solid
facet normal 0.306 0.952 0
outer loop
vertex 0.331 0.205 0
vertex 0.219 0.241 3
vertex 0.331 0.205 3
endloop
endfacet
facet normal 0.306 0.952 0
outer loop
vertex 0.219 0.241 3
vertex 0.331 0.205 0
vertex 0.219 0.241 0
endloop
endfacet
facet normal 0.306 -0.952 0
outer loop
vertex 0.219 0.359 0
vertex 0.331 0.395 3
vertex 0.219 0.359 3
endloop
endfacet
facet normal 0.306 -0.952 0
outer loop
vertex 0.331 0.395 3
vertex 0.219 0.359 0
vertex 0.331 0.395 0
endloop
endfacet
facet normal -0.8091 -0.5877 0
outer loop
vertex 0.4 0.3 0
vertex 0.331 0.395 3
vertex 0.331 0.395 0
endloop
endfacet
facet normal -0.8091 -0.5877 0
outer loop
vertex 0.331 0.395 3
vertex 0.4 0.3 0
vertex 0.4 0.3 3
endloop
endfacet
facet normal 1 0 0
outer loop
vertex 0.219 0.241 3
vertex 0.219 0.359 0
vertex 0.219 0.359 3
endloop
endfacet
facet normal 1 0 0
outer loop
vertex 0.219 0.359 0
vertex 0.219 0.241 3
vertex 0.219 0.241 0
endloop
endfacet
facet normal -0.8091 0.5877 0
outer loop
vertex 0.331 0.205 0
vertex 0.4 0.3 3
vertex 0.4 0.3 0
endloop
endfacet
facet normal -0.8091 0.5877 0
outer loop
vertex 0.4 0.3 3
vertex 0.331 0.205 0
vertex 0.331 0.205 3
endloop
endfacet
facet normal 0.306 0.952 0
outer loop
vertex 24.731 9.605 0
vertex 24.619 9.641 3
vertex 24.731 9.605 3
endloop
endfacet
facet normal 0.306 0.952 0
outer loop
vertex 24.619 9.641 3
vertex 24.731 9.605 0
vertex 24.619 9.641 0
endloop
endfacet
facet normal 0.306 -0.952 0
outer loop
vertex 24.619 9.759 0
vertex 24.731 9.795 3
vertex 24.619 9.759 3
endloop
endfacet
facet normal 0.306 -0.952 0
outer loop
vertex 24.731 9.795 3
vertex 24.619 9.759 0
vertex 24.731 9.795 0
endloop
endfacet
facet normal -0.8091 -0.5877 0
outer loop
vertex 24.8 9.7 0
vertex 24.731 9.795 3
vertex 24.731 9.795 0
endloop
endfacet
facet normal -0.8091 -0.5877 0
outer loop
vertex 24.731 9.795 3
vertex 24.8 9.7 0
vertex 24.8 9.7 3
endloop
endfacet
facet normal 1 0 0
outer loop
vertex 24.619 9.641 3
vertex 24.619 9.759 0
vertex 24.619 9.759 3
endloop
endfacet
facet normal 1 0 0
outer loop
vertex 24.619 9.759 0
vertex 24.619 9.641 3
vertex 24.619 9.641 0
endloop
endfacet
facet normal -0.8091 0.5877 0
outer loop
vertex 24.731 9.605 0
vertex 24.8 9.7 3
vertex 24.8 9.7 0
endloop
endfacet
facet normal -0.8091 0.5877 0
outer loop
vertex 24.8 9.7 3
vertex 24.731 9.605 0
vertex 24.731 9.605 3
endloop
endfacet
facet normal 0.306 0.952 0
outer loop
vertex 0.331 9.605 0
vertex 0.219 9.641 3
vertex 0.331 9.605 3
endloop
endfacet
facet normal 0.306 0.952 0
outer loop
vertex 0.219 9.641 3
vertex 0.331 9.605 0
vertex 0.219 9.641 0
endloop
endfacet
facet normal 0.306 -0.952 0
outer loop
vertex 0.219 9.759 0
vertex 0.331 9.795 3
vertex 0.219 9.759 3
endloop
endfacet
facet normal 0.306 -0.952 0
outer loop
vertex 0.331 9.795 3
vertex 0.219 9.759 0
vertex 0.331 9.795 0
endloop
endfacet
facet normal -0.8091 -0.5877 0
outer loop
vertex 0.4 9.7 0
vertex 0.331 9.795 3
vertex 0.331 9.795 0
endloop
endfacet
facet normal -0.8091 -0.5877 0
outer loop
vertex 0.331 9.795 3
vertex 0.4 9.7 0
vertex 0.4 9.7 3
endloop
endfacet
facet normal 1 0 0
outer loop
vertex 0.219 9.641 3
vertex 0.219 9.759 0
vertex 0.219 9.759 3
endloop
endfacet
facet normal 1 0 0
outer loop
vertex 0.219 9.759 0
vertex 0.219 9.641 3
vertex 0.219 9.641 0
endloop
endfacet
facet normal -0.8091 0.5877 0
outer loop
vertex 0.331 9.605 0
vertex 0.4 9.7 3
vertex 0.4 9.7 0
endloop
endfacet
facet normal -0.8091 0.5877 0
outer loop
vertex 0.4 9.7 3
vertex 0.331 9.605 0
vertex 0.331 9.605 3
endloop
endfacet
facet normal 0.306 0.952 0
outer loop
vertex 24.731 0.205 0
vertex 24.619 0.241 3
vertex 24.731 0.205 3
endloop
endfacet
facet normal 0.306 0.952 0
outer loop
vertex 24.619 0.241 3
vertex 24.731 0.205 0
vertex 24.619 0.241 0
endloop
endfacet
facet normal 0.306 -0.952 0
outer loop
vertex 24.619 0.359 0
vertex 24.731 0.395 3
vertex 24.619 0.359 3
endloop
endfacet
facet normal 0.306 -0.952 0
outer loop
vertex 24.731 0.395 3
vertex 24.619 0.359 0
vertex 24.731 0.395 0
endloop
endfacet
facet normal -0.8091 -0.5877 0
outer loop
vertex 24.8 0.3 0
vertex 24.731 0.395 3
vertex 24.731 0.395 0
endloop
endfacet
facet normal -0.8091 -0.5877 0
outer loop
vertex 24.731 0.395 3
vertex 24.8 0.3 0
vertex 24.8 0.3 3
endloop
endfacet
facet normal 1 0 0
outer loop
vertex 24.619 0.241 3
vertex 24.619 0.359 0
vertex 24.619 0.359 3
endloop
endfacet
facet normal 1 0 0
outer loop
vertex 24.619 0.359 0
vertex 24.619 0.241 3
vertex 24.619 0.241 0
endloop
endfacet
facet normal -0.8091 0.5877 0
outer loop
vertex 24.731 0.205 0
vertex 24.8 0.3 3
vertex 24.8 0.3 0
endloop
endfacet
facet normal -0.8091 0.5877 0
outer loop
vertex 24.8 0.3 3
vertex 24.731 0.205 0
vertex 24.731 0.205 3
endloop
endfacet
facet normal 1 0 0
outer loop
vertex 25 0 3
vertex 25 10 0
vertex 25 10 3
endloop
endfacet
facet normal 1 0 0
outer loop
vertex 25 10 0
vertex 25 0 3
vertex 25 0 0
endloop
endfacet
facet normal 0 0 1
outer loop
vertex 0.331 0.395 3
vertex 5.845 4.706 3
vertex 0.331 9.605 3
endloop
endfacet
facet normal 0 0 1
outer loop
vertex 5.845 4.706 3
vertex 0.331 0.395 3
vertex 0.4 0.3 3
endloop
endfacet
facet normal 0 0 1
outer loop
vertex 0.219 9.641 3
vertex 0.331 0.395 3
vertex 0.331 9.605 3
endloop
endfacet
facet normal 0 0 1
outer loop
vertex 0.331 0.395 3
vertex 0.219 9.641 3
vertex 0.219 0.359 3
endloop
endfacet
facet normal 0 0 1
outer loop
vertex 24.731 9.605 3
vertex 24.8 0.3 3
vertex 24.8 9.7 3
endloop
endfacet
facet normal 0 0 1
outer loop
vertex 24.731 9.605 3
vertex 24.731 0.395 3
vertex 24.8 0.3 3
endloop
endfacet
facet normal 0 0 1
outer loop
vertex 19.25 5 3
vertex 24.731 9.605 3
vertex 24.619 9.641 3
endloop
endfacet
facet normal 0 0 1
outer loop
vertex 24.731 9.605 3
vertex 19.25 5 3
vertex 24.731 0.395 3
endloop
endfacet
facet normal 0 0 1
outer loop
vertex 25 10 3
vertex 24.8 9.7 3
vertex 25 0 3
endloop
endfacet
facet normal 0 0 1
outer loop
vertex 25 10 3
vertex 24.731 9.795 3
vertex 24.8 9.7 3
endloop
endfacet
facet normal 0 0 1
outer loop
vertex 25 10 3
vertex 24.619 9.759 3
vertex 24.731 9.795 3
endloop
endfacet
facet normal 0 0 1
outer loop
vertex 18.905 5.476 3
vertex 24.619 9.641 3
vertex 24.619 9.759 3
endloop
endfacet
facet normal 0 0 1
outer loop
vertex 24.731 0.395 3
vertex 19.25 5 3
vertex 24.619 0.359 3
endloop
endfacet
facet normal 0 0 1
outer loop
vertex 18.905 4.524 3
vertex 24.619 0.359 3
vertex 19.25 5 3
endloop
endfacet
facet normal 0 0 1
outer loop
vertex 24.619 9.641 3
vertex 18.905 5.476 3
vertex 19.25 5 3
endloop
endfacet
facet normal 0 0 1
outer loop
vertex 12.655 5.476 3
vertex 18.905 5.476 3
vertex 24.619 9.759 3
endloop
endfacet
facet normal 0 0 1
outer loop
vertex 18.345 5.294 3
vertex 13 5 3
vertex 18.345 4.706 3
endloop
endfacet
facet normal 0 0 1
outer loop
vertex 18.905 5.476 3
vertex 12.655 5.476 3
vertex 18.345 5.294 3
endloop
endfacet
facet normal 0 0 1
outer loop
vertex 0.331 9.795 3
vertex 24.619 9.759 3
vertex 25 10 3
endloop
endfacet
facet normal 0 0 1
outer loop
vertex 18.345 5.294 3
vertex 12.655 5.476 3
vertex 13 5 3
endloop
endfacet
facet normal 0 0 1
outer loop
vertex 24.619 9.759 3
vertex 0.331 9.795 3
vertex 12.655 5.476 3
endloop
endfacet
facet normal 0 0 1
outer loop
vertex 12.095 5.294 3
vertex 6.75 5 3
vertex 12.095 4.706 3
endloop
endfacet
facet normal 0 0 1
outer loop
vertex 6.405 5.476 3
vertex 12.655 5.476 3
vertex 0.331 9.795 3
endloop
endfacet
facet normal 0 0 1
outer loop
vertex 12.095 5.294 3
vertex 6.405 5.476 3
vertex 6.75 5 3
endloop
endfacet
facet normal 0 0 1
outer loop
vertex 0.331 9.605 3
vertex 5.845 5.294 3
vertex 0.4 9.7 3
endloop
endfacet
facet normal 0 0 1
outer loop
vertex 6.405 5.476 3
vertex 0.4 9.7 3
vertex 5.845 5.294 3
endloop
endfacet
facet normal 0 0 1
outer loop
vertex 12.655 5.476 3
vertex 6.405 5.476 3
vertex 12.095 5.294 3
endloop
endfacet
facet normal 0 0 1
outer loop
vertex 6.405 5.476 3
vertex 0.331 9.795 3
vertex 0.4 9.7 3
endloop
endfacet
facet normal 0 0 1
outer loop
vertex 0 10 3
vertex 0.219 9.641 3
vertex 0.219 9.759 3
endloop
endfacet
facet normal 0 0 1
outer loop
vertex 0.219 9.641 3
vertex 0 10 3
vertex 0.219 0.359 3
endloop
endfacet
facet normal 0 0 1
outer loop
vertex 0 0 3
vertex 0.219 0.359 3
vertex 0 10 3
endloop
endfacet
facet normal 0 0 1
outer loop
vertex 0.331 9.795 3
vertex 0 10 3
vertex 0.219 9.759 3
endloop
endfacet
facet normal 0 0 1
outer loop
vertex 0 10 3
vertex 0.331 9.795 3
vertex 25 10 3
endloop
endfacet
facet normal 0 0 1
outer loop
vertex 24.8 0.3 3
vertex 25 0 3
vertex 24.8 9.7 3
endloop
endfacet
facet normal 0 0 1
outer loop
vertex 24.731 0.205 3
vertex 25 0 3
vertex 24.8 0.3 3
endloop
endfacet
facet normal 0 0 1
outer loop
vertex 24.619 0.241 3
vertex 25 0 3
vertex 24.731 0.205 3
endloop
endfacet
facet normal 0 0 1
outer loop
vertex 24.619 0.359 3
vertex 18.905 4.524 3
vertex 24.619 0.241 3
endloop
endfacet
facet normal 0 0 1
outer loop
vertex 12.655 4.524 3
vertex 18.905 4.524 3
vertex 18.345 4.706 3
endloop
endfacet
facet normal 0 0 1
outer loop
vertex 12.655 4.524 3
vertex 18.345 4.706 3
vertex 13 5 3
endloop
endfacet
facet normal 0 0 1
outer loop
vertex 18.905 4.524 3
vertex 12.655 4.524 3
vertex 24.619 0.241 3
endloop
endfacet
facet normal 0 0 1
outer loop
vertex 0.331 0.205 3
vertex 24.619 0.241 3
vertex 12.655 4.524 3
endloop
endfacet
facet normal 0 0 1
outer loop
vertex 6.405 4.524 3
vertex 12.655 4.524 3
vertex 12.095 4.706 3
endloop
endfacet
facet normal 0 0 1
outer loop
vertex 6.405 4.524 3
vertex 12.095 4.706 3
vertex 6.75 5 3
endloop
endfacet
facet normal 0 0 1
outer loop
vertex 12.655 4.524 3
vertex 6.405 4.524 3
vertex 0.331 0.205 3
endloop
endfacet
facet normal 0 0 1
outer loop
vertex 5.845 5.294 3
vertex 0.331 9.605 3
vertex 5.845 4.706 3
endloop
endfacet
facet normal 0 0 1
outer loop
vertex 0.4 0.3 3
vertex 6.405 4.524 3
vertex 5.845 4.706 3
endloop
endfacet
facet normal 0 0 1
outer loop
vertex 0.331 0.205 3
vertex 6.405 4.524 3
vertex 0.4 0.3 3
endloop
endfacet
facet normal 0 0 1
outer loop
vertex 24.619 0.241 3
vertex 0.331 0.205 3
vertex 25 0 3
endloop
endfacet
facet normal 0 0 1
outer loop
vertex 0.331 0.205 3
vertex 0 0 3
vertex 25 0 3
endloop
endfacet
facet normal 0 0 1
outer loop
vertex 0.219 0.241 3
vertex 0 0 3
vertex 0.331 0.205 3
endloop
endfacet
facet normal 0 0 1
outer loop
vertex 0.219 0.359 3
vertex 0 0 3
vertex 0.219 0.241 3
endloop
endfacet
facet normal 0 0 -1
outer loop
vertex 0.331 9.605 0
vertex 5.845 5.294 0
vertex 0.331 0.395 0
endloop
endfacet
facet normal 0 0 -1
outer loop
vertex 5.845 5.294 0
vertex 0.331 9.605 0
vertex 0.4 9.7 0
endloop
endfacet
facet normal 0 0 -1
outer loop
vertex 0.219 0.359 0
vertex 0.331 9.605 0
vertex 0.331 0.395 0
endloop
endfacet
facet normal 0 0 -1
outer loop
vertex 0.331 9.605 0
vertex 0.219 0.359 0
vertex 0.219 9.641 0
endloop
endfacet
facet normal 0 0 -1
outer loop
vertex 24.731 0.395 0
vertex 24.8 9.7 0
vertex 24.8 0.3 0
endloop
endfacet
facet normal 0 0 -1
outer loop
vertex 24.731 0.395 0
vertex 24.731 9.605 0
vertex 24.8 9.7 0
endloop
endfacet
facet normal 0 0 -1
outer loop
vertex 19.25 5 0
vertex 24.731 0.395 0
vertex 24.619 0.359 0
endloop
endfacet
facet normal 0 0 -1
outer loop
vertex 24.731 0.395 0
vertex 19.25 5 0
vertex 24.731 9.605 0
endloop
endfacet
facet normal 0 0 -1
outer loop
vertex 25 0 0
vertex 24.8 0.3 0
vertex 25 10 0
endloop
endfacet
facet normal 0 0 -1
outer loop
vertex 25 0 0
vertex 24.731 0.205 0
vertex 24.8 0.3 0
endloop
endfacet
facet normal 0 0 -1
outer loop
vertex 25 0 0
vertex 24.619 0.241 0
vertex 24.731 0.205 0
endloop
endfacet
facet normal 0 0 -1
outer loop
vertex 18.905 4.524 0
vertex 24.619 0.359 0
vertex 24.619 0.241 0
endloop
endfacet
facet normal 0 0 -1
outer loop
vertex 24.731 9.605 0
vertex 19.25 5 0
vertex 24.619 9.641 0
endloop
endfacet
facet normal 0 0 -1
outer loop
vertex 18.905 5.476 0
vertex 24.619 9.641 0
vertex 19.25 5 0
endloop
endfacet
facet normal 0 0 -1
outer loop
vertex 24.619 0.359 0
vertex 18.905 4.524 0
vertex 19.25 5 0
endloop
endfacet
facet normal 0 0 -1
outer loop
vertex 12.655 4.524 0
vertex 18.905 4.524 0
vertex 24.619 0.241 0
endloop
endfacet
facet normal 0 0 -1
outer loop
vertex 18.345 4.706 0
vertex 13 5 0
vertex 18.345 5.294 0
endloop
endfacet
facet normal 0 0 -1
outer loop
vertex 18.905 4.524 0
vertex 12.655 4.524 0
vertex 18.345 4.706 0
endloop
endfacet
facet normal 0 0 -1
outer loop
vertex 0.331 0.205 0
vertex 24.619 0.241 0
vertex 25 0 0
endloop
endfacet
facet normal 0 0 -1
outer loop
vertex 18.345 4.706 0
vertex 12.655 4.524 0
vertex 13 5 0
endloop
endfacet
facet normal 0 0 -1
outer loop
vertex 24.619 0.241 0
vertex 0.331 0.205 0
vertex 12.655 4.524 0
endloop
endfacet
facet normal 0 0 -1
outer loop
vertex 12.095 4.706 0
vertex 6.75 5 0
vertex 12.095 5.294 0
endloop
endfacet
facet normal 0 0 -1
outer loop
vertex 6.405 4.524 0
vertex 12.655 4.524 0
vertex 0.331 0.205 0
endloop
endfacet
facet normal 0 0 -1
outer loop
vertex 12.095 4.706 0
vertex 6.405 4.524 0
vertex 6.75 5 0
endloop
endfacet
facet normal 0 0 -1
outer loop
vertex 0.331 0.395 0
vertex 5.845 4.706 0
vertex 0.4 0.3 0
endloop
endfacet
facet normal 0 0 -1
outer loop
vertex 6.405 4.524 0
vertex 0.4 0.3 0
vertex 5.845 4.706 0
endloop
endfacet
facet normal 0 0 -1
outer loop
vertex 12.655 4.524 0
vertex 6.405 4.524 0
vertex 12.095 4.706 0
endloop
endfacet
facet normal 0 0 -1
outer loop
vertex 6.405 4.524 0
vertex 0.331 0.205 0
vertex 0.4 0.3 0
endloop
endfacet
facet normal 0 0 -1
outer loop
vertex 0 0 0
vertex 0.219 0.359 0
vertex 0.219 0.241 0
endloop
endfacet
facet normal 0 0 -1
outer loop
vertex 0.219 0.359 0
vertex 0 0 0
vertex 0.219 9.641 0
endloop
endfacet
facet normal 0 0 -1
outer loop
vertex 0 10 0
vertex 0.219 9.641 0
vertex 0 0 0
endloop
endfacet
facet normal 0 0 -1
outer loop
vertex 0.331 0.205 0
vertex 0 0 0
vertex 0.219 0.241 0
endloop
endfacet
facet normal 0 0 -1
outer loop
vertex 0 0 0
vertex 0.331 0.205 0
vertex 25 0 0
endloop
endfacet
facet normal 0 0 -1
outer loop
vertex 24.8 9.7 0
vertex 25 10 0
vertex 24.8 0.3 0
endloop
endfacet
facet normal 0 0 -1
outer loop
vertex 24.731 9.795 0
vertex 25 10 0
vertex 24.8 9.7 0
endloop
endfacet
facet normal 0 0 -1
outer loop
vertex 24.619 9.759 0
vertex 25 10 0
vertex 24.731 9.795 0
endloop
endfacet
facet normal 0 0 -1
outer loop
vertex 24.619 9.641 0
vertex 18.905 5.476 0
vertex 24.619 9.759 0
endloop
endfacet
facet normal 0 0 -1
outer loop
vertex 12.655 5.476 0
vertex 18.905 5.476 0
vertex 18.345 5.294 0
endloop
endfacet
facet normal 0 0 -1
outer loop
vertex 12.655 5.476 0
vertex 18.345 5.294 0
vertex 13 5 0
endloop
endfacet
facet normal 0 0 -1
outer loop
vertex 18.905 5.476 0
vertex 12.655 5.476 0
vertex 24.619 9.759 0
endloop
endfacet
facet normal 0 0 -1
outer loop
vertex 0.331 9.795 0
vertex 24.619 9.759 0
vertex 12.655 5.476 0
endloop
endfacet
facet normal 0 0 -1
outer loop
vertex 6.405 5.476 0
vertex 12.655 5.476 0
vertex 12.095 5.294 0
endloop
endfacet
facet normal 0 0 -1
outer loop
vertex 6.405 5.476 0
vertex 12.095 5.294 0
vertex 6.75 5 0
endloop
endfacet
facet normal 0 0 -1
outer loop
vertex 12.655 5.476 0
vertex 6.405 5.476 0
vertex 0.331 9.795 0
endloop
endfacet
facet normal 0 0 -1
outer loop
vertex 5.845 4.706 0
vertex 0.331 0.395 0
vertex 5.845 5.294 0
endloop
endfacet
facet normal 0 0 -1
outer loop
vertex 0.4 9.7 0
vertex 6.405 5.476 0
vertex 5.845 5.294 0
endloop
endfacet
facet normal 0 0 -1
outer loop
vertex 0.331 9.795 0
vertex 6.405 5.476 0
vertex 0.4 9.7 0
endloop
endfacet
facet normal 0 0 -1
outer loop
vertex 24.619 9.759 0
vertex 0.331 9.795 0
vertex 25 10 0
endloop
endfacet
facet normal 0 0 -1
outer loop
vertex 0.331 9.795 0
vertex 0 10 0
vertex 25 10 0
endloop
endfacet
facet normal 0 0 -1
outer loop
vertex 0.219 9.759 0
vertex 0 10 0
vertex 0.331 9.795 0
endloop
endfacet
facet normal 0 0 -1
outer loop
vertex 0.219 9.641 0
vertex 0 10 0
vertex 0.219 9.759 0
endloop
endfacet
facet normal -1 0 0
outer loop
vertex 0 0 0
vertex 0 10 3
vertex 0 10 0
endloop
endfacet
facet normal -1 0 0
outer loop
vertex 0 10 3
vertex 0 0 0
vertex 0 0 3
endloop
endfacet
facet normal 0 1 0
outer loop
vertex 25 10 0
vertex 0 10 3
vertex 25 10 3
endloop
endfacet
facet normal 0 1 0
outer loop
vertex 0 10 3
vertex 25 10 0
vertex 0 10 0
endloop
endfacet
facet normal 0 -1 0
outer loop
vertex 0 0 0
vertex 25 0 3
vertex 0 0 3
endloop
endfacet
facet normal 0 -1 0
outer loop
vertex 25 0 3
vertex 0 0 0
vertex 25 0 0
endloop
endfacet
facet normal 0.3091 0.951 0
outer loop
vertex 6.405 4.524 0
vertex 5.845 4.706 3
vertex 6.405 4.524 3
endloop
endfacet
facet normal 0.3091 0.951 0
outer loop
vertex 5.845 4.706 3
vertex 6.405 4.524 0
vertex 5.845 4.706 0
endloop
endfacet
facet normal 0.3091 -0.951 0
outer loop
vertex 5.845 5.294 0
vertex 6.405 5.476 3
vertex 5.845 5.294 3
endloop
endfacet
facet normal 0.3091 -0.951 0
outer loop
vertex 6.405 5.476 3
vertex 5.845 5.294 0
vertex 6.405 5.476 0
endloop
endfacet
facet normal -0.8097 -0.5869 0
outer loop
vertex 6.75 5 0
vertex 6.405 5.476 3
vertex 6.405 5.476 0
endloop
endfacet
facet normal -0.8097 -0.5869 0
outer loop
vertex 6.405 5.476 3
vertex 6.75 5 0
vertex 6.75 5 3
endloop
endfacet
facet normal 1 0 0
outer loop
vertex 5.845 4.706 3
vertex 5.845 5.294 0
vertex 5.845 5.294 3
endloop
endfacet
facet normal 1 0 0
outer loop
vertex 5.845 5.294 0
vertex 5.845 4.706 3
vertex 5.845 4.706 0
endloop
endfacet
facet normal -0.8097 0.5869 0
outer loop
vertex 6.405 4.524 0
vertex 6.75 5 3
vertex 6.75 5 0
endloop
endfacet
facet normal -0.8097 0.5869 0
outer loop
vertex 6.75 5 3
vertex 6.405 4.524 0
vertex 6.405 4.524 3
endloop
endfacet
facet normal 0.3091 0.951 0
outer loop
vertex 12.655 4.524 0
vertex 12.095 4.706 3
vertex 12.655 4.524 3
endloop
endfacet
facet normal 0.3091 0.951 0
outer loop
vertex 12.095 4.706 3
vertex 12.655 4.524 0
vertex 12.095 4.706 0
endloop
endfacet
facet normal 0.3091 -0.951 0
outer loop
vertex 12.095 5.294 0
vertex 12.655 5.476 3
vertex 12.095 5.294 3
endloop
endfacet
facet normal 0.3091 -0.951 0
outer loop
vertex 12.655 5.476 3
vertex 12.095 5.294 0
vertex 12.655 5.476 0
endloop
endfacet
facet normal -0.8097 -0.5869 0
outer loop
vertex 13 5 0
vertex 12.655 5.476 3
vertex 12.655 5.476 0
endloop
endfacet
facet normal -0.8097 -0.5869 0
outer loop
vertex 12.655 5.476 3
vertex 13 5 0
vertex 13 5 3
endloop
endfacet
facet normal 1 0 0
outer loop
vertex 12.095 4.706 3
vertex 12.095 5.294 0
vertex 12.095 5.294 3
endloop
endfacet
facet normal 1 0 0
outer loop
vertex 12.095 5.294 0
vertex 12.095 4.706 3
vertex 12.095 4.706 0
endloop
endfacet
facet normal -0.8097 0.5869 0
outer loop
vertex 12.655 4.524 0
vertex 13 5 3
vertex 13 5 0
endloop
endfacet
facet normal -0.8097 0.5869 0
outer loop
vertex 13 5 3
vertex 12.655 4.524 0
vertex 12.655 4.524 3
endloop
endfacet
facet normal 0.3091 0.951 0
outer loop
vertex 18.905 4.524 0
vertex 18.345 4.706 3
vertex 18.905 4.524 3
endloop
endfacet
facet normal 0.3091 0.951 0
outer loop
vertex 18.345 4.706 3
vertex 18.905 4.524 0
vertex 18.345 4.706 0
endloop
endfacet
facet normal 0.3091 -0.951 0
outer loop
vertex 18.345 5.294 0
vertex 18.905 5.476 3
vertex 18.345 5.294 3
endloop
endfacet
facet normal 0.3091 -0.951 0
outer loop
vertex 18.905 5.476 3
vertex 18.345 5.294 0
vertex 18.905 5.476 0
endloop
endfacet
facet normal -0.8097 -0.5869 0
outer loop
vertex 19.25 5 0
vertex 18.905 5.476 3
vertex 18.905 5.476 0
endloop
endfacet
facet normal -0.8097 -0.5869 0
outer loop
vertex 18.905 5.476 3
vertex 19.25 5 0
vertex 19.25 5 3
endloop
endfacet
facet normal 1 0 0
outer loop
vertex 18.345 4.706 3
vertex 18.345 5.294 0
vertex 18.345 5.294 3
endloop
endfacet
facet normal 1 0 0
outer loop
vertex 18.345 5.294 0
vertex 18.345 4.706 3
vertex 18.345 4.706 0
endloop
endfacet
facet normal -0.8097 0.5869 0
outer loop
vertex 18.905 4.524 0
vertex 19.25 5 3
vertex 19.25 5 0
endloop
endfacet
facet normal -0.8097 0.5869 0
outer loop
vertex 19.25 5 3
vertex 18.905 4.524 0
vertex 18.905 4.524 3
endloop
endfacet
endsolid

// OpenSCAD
w=25;
h=10;
t=3;

mtghole=1; // set to zero for no mounting holes

difference() {
// main panel
    cube([w,h,t]);
// switch cut outs
    translate([w/4,h/2,-.1]) cylinder(h=2*t,r=.5);
    translate([2*w/4,h/2,-.1]) cylinder(h=2*t,r=.5);
    translate([3*w/4,h/2,-.1]) cylinder(h=2*t,r=.5);
// mounting holes
    if (mtghole==1) {
        translate([.3,.3,-.1]) cylinder(h=2*t,r=.1);
        translate([w-.3,h-.3,-.1]) cylinder(h=2*t,r=.1);
        translate([.3,h-.3,-.1]) cylinder(h=2*t,r=.1);
        translate([w-.3,.3,-.1]) cylinder(h=2*t,r=.1);
    }
}
